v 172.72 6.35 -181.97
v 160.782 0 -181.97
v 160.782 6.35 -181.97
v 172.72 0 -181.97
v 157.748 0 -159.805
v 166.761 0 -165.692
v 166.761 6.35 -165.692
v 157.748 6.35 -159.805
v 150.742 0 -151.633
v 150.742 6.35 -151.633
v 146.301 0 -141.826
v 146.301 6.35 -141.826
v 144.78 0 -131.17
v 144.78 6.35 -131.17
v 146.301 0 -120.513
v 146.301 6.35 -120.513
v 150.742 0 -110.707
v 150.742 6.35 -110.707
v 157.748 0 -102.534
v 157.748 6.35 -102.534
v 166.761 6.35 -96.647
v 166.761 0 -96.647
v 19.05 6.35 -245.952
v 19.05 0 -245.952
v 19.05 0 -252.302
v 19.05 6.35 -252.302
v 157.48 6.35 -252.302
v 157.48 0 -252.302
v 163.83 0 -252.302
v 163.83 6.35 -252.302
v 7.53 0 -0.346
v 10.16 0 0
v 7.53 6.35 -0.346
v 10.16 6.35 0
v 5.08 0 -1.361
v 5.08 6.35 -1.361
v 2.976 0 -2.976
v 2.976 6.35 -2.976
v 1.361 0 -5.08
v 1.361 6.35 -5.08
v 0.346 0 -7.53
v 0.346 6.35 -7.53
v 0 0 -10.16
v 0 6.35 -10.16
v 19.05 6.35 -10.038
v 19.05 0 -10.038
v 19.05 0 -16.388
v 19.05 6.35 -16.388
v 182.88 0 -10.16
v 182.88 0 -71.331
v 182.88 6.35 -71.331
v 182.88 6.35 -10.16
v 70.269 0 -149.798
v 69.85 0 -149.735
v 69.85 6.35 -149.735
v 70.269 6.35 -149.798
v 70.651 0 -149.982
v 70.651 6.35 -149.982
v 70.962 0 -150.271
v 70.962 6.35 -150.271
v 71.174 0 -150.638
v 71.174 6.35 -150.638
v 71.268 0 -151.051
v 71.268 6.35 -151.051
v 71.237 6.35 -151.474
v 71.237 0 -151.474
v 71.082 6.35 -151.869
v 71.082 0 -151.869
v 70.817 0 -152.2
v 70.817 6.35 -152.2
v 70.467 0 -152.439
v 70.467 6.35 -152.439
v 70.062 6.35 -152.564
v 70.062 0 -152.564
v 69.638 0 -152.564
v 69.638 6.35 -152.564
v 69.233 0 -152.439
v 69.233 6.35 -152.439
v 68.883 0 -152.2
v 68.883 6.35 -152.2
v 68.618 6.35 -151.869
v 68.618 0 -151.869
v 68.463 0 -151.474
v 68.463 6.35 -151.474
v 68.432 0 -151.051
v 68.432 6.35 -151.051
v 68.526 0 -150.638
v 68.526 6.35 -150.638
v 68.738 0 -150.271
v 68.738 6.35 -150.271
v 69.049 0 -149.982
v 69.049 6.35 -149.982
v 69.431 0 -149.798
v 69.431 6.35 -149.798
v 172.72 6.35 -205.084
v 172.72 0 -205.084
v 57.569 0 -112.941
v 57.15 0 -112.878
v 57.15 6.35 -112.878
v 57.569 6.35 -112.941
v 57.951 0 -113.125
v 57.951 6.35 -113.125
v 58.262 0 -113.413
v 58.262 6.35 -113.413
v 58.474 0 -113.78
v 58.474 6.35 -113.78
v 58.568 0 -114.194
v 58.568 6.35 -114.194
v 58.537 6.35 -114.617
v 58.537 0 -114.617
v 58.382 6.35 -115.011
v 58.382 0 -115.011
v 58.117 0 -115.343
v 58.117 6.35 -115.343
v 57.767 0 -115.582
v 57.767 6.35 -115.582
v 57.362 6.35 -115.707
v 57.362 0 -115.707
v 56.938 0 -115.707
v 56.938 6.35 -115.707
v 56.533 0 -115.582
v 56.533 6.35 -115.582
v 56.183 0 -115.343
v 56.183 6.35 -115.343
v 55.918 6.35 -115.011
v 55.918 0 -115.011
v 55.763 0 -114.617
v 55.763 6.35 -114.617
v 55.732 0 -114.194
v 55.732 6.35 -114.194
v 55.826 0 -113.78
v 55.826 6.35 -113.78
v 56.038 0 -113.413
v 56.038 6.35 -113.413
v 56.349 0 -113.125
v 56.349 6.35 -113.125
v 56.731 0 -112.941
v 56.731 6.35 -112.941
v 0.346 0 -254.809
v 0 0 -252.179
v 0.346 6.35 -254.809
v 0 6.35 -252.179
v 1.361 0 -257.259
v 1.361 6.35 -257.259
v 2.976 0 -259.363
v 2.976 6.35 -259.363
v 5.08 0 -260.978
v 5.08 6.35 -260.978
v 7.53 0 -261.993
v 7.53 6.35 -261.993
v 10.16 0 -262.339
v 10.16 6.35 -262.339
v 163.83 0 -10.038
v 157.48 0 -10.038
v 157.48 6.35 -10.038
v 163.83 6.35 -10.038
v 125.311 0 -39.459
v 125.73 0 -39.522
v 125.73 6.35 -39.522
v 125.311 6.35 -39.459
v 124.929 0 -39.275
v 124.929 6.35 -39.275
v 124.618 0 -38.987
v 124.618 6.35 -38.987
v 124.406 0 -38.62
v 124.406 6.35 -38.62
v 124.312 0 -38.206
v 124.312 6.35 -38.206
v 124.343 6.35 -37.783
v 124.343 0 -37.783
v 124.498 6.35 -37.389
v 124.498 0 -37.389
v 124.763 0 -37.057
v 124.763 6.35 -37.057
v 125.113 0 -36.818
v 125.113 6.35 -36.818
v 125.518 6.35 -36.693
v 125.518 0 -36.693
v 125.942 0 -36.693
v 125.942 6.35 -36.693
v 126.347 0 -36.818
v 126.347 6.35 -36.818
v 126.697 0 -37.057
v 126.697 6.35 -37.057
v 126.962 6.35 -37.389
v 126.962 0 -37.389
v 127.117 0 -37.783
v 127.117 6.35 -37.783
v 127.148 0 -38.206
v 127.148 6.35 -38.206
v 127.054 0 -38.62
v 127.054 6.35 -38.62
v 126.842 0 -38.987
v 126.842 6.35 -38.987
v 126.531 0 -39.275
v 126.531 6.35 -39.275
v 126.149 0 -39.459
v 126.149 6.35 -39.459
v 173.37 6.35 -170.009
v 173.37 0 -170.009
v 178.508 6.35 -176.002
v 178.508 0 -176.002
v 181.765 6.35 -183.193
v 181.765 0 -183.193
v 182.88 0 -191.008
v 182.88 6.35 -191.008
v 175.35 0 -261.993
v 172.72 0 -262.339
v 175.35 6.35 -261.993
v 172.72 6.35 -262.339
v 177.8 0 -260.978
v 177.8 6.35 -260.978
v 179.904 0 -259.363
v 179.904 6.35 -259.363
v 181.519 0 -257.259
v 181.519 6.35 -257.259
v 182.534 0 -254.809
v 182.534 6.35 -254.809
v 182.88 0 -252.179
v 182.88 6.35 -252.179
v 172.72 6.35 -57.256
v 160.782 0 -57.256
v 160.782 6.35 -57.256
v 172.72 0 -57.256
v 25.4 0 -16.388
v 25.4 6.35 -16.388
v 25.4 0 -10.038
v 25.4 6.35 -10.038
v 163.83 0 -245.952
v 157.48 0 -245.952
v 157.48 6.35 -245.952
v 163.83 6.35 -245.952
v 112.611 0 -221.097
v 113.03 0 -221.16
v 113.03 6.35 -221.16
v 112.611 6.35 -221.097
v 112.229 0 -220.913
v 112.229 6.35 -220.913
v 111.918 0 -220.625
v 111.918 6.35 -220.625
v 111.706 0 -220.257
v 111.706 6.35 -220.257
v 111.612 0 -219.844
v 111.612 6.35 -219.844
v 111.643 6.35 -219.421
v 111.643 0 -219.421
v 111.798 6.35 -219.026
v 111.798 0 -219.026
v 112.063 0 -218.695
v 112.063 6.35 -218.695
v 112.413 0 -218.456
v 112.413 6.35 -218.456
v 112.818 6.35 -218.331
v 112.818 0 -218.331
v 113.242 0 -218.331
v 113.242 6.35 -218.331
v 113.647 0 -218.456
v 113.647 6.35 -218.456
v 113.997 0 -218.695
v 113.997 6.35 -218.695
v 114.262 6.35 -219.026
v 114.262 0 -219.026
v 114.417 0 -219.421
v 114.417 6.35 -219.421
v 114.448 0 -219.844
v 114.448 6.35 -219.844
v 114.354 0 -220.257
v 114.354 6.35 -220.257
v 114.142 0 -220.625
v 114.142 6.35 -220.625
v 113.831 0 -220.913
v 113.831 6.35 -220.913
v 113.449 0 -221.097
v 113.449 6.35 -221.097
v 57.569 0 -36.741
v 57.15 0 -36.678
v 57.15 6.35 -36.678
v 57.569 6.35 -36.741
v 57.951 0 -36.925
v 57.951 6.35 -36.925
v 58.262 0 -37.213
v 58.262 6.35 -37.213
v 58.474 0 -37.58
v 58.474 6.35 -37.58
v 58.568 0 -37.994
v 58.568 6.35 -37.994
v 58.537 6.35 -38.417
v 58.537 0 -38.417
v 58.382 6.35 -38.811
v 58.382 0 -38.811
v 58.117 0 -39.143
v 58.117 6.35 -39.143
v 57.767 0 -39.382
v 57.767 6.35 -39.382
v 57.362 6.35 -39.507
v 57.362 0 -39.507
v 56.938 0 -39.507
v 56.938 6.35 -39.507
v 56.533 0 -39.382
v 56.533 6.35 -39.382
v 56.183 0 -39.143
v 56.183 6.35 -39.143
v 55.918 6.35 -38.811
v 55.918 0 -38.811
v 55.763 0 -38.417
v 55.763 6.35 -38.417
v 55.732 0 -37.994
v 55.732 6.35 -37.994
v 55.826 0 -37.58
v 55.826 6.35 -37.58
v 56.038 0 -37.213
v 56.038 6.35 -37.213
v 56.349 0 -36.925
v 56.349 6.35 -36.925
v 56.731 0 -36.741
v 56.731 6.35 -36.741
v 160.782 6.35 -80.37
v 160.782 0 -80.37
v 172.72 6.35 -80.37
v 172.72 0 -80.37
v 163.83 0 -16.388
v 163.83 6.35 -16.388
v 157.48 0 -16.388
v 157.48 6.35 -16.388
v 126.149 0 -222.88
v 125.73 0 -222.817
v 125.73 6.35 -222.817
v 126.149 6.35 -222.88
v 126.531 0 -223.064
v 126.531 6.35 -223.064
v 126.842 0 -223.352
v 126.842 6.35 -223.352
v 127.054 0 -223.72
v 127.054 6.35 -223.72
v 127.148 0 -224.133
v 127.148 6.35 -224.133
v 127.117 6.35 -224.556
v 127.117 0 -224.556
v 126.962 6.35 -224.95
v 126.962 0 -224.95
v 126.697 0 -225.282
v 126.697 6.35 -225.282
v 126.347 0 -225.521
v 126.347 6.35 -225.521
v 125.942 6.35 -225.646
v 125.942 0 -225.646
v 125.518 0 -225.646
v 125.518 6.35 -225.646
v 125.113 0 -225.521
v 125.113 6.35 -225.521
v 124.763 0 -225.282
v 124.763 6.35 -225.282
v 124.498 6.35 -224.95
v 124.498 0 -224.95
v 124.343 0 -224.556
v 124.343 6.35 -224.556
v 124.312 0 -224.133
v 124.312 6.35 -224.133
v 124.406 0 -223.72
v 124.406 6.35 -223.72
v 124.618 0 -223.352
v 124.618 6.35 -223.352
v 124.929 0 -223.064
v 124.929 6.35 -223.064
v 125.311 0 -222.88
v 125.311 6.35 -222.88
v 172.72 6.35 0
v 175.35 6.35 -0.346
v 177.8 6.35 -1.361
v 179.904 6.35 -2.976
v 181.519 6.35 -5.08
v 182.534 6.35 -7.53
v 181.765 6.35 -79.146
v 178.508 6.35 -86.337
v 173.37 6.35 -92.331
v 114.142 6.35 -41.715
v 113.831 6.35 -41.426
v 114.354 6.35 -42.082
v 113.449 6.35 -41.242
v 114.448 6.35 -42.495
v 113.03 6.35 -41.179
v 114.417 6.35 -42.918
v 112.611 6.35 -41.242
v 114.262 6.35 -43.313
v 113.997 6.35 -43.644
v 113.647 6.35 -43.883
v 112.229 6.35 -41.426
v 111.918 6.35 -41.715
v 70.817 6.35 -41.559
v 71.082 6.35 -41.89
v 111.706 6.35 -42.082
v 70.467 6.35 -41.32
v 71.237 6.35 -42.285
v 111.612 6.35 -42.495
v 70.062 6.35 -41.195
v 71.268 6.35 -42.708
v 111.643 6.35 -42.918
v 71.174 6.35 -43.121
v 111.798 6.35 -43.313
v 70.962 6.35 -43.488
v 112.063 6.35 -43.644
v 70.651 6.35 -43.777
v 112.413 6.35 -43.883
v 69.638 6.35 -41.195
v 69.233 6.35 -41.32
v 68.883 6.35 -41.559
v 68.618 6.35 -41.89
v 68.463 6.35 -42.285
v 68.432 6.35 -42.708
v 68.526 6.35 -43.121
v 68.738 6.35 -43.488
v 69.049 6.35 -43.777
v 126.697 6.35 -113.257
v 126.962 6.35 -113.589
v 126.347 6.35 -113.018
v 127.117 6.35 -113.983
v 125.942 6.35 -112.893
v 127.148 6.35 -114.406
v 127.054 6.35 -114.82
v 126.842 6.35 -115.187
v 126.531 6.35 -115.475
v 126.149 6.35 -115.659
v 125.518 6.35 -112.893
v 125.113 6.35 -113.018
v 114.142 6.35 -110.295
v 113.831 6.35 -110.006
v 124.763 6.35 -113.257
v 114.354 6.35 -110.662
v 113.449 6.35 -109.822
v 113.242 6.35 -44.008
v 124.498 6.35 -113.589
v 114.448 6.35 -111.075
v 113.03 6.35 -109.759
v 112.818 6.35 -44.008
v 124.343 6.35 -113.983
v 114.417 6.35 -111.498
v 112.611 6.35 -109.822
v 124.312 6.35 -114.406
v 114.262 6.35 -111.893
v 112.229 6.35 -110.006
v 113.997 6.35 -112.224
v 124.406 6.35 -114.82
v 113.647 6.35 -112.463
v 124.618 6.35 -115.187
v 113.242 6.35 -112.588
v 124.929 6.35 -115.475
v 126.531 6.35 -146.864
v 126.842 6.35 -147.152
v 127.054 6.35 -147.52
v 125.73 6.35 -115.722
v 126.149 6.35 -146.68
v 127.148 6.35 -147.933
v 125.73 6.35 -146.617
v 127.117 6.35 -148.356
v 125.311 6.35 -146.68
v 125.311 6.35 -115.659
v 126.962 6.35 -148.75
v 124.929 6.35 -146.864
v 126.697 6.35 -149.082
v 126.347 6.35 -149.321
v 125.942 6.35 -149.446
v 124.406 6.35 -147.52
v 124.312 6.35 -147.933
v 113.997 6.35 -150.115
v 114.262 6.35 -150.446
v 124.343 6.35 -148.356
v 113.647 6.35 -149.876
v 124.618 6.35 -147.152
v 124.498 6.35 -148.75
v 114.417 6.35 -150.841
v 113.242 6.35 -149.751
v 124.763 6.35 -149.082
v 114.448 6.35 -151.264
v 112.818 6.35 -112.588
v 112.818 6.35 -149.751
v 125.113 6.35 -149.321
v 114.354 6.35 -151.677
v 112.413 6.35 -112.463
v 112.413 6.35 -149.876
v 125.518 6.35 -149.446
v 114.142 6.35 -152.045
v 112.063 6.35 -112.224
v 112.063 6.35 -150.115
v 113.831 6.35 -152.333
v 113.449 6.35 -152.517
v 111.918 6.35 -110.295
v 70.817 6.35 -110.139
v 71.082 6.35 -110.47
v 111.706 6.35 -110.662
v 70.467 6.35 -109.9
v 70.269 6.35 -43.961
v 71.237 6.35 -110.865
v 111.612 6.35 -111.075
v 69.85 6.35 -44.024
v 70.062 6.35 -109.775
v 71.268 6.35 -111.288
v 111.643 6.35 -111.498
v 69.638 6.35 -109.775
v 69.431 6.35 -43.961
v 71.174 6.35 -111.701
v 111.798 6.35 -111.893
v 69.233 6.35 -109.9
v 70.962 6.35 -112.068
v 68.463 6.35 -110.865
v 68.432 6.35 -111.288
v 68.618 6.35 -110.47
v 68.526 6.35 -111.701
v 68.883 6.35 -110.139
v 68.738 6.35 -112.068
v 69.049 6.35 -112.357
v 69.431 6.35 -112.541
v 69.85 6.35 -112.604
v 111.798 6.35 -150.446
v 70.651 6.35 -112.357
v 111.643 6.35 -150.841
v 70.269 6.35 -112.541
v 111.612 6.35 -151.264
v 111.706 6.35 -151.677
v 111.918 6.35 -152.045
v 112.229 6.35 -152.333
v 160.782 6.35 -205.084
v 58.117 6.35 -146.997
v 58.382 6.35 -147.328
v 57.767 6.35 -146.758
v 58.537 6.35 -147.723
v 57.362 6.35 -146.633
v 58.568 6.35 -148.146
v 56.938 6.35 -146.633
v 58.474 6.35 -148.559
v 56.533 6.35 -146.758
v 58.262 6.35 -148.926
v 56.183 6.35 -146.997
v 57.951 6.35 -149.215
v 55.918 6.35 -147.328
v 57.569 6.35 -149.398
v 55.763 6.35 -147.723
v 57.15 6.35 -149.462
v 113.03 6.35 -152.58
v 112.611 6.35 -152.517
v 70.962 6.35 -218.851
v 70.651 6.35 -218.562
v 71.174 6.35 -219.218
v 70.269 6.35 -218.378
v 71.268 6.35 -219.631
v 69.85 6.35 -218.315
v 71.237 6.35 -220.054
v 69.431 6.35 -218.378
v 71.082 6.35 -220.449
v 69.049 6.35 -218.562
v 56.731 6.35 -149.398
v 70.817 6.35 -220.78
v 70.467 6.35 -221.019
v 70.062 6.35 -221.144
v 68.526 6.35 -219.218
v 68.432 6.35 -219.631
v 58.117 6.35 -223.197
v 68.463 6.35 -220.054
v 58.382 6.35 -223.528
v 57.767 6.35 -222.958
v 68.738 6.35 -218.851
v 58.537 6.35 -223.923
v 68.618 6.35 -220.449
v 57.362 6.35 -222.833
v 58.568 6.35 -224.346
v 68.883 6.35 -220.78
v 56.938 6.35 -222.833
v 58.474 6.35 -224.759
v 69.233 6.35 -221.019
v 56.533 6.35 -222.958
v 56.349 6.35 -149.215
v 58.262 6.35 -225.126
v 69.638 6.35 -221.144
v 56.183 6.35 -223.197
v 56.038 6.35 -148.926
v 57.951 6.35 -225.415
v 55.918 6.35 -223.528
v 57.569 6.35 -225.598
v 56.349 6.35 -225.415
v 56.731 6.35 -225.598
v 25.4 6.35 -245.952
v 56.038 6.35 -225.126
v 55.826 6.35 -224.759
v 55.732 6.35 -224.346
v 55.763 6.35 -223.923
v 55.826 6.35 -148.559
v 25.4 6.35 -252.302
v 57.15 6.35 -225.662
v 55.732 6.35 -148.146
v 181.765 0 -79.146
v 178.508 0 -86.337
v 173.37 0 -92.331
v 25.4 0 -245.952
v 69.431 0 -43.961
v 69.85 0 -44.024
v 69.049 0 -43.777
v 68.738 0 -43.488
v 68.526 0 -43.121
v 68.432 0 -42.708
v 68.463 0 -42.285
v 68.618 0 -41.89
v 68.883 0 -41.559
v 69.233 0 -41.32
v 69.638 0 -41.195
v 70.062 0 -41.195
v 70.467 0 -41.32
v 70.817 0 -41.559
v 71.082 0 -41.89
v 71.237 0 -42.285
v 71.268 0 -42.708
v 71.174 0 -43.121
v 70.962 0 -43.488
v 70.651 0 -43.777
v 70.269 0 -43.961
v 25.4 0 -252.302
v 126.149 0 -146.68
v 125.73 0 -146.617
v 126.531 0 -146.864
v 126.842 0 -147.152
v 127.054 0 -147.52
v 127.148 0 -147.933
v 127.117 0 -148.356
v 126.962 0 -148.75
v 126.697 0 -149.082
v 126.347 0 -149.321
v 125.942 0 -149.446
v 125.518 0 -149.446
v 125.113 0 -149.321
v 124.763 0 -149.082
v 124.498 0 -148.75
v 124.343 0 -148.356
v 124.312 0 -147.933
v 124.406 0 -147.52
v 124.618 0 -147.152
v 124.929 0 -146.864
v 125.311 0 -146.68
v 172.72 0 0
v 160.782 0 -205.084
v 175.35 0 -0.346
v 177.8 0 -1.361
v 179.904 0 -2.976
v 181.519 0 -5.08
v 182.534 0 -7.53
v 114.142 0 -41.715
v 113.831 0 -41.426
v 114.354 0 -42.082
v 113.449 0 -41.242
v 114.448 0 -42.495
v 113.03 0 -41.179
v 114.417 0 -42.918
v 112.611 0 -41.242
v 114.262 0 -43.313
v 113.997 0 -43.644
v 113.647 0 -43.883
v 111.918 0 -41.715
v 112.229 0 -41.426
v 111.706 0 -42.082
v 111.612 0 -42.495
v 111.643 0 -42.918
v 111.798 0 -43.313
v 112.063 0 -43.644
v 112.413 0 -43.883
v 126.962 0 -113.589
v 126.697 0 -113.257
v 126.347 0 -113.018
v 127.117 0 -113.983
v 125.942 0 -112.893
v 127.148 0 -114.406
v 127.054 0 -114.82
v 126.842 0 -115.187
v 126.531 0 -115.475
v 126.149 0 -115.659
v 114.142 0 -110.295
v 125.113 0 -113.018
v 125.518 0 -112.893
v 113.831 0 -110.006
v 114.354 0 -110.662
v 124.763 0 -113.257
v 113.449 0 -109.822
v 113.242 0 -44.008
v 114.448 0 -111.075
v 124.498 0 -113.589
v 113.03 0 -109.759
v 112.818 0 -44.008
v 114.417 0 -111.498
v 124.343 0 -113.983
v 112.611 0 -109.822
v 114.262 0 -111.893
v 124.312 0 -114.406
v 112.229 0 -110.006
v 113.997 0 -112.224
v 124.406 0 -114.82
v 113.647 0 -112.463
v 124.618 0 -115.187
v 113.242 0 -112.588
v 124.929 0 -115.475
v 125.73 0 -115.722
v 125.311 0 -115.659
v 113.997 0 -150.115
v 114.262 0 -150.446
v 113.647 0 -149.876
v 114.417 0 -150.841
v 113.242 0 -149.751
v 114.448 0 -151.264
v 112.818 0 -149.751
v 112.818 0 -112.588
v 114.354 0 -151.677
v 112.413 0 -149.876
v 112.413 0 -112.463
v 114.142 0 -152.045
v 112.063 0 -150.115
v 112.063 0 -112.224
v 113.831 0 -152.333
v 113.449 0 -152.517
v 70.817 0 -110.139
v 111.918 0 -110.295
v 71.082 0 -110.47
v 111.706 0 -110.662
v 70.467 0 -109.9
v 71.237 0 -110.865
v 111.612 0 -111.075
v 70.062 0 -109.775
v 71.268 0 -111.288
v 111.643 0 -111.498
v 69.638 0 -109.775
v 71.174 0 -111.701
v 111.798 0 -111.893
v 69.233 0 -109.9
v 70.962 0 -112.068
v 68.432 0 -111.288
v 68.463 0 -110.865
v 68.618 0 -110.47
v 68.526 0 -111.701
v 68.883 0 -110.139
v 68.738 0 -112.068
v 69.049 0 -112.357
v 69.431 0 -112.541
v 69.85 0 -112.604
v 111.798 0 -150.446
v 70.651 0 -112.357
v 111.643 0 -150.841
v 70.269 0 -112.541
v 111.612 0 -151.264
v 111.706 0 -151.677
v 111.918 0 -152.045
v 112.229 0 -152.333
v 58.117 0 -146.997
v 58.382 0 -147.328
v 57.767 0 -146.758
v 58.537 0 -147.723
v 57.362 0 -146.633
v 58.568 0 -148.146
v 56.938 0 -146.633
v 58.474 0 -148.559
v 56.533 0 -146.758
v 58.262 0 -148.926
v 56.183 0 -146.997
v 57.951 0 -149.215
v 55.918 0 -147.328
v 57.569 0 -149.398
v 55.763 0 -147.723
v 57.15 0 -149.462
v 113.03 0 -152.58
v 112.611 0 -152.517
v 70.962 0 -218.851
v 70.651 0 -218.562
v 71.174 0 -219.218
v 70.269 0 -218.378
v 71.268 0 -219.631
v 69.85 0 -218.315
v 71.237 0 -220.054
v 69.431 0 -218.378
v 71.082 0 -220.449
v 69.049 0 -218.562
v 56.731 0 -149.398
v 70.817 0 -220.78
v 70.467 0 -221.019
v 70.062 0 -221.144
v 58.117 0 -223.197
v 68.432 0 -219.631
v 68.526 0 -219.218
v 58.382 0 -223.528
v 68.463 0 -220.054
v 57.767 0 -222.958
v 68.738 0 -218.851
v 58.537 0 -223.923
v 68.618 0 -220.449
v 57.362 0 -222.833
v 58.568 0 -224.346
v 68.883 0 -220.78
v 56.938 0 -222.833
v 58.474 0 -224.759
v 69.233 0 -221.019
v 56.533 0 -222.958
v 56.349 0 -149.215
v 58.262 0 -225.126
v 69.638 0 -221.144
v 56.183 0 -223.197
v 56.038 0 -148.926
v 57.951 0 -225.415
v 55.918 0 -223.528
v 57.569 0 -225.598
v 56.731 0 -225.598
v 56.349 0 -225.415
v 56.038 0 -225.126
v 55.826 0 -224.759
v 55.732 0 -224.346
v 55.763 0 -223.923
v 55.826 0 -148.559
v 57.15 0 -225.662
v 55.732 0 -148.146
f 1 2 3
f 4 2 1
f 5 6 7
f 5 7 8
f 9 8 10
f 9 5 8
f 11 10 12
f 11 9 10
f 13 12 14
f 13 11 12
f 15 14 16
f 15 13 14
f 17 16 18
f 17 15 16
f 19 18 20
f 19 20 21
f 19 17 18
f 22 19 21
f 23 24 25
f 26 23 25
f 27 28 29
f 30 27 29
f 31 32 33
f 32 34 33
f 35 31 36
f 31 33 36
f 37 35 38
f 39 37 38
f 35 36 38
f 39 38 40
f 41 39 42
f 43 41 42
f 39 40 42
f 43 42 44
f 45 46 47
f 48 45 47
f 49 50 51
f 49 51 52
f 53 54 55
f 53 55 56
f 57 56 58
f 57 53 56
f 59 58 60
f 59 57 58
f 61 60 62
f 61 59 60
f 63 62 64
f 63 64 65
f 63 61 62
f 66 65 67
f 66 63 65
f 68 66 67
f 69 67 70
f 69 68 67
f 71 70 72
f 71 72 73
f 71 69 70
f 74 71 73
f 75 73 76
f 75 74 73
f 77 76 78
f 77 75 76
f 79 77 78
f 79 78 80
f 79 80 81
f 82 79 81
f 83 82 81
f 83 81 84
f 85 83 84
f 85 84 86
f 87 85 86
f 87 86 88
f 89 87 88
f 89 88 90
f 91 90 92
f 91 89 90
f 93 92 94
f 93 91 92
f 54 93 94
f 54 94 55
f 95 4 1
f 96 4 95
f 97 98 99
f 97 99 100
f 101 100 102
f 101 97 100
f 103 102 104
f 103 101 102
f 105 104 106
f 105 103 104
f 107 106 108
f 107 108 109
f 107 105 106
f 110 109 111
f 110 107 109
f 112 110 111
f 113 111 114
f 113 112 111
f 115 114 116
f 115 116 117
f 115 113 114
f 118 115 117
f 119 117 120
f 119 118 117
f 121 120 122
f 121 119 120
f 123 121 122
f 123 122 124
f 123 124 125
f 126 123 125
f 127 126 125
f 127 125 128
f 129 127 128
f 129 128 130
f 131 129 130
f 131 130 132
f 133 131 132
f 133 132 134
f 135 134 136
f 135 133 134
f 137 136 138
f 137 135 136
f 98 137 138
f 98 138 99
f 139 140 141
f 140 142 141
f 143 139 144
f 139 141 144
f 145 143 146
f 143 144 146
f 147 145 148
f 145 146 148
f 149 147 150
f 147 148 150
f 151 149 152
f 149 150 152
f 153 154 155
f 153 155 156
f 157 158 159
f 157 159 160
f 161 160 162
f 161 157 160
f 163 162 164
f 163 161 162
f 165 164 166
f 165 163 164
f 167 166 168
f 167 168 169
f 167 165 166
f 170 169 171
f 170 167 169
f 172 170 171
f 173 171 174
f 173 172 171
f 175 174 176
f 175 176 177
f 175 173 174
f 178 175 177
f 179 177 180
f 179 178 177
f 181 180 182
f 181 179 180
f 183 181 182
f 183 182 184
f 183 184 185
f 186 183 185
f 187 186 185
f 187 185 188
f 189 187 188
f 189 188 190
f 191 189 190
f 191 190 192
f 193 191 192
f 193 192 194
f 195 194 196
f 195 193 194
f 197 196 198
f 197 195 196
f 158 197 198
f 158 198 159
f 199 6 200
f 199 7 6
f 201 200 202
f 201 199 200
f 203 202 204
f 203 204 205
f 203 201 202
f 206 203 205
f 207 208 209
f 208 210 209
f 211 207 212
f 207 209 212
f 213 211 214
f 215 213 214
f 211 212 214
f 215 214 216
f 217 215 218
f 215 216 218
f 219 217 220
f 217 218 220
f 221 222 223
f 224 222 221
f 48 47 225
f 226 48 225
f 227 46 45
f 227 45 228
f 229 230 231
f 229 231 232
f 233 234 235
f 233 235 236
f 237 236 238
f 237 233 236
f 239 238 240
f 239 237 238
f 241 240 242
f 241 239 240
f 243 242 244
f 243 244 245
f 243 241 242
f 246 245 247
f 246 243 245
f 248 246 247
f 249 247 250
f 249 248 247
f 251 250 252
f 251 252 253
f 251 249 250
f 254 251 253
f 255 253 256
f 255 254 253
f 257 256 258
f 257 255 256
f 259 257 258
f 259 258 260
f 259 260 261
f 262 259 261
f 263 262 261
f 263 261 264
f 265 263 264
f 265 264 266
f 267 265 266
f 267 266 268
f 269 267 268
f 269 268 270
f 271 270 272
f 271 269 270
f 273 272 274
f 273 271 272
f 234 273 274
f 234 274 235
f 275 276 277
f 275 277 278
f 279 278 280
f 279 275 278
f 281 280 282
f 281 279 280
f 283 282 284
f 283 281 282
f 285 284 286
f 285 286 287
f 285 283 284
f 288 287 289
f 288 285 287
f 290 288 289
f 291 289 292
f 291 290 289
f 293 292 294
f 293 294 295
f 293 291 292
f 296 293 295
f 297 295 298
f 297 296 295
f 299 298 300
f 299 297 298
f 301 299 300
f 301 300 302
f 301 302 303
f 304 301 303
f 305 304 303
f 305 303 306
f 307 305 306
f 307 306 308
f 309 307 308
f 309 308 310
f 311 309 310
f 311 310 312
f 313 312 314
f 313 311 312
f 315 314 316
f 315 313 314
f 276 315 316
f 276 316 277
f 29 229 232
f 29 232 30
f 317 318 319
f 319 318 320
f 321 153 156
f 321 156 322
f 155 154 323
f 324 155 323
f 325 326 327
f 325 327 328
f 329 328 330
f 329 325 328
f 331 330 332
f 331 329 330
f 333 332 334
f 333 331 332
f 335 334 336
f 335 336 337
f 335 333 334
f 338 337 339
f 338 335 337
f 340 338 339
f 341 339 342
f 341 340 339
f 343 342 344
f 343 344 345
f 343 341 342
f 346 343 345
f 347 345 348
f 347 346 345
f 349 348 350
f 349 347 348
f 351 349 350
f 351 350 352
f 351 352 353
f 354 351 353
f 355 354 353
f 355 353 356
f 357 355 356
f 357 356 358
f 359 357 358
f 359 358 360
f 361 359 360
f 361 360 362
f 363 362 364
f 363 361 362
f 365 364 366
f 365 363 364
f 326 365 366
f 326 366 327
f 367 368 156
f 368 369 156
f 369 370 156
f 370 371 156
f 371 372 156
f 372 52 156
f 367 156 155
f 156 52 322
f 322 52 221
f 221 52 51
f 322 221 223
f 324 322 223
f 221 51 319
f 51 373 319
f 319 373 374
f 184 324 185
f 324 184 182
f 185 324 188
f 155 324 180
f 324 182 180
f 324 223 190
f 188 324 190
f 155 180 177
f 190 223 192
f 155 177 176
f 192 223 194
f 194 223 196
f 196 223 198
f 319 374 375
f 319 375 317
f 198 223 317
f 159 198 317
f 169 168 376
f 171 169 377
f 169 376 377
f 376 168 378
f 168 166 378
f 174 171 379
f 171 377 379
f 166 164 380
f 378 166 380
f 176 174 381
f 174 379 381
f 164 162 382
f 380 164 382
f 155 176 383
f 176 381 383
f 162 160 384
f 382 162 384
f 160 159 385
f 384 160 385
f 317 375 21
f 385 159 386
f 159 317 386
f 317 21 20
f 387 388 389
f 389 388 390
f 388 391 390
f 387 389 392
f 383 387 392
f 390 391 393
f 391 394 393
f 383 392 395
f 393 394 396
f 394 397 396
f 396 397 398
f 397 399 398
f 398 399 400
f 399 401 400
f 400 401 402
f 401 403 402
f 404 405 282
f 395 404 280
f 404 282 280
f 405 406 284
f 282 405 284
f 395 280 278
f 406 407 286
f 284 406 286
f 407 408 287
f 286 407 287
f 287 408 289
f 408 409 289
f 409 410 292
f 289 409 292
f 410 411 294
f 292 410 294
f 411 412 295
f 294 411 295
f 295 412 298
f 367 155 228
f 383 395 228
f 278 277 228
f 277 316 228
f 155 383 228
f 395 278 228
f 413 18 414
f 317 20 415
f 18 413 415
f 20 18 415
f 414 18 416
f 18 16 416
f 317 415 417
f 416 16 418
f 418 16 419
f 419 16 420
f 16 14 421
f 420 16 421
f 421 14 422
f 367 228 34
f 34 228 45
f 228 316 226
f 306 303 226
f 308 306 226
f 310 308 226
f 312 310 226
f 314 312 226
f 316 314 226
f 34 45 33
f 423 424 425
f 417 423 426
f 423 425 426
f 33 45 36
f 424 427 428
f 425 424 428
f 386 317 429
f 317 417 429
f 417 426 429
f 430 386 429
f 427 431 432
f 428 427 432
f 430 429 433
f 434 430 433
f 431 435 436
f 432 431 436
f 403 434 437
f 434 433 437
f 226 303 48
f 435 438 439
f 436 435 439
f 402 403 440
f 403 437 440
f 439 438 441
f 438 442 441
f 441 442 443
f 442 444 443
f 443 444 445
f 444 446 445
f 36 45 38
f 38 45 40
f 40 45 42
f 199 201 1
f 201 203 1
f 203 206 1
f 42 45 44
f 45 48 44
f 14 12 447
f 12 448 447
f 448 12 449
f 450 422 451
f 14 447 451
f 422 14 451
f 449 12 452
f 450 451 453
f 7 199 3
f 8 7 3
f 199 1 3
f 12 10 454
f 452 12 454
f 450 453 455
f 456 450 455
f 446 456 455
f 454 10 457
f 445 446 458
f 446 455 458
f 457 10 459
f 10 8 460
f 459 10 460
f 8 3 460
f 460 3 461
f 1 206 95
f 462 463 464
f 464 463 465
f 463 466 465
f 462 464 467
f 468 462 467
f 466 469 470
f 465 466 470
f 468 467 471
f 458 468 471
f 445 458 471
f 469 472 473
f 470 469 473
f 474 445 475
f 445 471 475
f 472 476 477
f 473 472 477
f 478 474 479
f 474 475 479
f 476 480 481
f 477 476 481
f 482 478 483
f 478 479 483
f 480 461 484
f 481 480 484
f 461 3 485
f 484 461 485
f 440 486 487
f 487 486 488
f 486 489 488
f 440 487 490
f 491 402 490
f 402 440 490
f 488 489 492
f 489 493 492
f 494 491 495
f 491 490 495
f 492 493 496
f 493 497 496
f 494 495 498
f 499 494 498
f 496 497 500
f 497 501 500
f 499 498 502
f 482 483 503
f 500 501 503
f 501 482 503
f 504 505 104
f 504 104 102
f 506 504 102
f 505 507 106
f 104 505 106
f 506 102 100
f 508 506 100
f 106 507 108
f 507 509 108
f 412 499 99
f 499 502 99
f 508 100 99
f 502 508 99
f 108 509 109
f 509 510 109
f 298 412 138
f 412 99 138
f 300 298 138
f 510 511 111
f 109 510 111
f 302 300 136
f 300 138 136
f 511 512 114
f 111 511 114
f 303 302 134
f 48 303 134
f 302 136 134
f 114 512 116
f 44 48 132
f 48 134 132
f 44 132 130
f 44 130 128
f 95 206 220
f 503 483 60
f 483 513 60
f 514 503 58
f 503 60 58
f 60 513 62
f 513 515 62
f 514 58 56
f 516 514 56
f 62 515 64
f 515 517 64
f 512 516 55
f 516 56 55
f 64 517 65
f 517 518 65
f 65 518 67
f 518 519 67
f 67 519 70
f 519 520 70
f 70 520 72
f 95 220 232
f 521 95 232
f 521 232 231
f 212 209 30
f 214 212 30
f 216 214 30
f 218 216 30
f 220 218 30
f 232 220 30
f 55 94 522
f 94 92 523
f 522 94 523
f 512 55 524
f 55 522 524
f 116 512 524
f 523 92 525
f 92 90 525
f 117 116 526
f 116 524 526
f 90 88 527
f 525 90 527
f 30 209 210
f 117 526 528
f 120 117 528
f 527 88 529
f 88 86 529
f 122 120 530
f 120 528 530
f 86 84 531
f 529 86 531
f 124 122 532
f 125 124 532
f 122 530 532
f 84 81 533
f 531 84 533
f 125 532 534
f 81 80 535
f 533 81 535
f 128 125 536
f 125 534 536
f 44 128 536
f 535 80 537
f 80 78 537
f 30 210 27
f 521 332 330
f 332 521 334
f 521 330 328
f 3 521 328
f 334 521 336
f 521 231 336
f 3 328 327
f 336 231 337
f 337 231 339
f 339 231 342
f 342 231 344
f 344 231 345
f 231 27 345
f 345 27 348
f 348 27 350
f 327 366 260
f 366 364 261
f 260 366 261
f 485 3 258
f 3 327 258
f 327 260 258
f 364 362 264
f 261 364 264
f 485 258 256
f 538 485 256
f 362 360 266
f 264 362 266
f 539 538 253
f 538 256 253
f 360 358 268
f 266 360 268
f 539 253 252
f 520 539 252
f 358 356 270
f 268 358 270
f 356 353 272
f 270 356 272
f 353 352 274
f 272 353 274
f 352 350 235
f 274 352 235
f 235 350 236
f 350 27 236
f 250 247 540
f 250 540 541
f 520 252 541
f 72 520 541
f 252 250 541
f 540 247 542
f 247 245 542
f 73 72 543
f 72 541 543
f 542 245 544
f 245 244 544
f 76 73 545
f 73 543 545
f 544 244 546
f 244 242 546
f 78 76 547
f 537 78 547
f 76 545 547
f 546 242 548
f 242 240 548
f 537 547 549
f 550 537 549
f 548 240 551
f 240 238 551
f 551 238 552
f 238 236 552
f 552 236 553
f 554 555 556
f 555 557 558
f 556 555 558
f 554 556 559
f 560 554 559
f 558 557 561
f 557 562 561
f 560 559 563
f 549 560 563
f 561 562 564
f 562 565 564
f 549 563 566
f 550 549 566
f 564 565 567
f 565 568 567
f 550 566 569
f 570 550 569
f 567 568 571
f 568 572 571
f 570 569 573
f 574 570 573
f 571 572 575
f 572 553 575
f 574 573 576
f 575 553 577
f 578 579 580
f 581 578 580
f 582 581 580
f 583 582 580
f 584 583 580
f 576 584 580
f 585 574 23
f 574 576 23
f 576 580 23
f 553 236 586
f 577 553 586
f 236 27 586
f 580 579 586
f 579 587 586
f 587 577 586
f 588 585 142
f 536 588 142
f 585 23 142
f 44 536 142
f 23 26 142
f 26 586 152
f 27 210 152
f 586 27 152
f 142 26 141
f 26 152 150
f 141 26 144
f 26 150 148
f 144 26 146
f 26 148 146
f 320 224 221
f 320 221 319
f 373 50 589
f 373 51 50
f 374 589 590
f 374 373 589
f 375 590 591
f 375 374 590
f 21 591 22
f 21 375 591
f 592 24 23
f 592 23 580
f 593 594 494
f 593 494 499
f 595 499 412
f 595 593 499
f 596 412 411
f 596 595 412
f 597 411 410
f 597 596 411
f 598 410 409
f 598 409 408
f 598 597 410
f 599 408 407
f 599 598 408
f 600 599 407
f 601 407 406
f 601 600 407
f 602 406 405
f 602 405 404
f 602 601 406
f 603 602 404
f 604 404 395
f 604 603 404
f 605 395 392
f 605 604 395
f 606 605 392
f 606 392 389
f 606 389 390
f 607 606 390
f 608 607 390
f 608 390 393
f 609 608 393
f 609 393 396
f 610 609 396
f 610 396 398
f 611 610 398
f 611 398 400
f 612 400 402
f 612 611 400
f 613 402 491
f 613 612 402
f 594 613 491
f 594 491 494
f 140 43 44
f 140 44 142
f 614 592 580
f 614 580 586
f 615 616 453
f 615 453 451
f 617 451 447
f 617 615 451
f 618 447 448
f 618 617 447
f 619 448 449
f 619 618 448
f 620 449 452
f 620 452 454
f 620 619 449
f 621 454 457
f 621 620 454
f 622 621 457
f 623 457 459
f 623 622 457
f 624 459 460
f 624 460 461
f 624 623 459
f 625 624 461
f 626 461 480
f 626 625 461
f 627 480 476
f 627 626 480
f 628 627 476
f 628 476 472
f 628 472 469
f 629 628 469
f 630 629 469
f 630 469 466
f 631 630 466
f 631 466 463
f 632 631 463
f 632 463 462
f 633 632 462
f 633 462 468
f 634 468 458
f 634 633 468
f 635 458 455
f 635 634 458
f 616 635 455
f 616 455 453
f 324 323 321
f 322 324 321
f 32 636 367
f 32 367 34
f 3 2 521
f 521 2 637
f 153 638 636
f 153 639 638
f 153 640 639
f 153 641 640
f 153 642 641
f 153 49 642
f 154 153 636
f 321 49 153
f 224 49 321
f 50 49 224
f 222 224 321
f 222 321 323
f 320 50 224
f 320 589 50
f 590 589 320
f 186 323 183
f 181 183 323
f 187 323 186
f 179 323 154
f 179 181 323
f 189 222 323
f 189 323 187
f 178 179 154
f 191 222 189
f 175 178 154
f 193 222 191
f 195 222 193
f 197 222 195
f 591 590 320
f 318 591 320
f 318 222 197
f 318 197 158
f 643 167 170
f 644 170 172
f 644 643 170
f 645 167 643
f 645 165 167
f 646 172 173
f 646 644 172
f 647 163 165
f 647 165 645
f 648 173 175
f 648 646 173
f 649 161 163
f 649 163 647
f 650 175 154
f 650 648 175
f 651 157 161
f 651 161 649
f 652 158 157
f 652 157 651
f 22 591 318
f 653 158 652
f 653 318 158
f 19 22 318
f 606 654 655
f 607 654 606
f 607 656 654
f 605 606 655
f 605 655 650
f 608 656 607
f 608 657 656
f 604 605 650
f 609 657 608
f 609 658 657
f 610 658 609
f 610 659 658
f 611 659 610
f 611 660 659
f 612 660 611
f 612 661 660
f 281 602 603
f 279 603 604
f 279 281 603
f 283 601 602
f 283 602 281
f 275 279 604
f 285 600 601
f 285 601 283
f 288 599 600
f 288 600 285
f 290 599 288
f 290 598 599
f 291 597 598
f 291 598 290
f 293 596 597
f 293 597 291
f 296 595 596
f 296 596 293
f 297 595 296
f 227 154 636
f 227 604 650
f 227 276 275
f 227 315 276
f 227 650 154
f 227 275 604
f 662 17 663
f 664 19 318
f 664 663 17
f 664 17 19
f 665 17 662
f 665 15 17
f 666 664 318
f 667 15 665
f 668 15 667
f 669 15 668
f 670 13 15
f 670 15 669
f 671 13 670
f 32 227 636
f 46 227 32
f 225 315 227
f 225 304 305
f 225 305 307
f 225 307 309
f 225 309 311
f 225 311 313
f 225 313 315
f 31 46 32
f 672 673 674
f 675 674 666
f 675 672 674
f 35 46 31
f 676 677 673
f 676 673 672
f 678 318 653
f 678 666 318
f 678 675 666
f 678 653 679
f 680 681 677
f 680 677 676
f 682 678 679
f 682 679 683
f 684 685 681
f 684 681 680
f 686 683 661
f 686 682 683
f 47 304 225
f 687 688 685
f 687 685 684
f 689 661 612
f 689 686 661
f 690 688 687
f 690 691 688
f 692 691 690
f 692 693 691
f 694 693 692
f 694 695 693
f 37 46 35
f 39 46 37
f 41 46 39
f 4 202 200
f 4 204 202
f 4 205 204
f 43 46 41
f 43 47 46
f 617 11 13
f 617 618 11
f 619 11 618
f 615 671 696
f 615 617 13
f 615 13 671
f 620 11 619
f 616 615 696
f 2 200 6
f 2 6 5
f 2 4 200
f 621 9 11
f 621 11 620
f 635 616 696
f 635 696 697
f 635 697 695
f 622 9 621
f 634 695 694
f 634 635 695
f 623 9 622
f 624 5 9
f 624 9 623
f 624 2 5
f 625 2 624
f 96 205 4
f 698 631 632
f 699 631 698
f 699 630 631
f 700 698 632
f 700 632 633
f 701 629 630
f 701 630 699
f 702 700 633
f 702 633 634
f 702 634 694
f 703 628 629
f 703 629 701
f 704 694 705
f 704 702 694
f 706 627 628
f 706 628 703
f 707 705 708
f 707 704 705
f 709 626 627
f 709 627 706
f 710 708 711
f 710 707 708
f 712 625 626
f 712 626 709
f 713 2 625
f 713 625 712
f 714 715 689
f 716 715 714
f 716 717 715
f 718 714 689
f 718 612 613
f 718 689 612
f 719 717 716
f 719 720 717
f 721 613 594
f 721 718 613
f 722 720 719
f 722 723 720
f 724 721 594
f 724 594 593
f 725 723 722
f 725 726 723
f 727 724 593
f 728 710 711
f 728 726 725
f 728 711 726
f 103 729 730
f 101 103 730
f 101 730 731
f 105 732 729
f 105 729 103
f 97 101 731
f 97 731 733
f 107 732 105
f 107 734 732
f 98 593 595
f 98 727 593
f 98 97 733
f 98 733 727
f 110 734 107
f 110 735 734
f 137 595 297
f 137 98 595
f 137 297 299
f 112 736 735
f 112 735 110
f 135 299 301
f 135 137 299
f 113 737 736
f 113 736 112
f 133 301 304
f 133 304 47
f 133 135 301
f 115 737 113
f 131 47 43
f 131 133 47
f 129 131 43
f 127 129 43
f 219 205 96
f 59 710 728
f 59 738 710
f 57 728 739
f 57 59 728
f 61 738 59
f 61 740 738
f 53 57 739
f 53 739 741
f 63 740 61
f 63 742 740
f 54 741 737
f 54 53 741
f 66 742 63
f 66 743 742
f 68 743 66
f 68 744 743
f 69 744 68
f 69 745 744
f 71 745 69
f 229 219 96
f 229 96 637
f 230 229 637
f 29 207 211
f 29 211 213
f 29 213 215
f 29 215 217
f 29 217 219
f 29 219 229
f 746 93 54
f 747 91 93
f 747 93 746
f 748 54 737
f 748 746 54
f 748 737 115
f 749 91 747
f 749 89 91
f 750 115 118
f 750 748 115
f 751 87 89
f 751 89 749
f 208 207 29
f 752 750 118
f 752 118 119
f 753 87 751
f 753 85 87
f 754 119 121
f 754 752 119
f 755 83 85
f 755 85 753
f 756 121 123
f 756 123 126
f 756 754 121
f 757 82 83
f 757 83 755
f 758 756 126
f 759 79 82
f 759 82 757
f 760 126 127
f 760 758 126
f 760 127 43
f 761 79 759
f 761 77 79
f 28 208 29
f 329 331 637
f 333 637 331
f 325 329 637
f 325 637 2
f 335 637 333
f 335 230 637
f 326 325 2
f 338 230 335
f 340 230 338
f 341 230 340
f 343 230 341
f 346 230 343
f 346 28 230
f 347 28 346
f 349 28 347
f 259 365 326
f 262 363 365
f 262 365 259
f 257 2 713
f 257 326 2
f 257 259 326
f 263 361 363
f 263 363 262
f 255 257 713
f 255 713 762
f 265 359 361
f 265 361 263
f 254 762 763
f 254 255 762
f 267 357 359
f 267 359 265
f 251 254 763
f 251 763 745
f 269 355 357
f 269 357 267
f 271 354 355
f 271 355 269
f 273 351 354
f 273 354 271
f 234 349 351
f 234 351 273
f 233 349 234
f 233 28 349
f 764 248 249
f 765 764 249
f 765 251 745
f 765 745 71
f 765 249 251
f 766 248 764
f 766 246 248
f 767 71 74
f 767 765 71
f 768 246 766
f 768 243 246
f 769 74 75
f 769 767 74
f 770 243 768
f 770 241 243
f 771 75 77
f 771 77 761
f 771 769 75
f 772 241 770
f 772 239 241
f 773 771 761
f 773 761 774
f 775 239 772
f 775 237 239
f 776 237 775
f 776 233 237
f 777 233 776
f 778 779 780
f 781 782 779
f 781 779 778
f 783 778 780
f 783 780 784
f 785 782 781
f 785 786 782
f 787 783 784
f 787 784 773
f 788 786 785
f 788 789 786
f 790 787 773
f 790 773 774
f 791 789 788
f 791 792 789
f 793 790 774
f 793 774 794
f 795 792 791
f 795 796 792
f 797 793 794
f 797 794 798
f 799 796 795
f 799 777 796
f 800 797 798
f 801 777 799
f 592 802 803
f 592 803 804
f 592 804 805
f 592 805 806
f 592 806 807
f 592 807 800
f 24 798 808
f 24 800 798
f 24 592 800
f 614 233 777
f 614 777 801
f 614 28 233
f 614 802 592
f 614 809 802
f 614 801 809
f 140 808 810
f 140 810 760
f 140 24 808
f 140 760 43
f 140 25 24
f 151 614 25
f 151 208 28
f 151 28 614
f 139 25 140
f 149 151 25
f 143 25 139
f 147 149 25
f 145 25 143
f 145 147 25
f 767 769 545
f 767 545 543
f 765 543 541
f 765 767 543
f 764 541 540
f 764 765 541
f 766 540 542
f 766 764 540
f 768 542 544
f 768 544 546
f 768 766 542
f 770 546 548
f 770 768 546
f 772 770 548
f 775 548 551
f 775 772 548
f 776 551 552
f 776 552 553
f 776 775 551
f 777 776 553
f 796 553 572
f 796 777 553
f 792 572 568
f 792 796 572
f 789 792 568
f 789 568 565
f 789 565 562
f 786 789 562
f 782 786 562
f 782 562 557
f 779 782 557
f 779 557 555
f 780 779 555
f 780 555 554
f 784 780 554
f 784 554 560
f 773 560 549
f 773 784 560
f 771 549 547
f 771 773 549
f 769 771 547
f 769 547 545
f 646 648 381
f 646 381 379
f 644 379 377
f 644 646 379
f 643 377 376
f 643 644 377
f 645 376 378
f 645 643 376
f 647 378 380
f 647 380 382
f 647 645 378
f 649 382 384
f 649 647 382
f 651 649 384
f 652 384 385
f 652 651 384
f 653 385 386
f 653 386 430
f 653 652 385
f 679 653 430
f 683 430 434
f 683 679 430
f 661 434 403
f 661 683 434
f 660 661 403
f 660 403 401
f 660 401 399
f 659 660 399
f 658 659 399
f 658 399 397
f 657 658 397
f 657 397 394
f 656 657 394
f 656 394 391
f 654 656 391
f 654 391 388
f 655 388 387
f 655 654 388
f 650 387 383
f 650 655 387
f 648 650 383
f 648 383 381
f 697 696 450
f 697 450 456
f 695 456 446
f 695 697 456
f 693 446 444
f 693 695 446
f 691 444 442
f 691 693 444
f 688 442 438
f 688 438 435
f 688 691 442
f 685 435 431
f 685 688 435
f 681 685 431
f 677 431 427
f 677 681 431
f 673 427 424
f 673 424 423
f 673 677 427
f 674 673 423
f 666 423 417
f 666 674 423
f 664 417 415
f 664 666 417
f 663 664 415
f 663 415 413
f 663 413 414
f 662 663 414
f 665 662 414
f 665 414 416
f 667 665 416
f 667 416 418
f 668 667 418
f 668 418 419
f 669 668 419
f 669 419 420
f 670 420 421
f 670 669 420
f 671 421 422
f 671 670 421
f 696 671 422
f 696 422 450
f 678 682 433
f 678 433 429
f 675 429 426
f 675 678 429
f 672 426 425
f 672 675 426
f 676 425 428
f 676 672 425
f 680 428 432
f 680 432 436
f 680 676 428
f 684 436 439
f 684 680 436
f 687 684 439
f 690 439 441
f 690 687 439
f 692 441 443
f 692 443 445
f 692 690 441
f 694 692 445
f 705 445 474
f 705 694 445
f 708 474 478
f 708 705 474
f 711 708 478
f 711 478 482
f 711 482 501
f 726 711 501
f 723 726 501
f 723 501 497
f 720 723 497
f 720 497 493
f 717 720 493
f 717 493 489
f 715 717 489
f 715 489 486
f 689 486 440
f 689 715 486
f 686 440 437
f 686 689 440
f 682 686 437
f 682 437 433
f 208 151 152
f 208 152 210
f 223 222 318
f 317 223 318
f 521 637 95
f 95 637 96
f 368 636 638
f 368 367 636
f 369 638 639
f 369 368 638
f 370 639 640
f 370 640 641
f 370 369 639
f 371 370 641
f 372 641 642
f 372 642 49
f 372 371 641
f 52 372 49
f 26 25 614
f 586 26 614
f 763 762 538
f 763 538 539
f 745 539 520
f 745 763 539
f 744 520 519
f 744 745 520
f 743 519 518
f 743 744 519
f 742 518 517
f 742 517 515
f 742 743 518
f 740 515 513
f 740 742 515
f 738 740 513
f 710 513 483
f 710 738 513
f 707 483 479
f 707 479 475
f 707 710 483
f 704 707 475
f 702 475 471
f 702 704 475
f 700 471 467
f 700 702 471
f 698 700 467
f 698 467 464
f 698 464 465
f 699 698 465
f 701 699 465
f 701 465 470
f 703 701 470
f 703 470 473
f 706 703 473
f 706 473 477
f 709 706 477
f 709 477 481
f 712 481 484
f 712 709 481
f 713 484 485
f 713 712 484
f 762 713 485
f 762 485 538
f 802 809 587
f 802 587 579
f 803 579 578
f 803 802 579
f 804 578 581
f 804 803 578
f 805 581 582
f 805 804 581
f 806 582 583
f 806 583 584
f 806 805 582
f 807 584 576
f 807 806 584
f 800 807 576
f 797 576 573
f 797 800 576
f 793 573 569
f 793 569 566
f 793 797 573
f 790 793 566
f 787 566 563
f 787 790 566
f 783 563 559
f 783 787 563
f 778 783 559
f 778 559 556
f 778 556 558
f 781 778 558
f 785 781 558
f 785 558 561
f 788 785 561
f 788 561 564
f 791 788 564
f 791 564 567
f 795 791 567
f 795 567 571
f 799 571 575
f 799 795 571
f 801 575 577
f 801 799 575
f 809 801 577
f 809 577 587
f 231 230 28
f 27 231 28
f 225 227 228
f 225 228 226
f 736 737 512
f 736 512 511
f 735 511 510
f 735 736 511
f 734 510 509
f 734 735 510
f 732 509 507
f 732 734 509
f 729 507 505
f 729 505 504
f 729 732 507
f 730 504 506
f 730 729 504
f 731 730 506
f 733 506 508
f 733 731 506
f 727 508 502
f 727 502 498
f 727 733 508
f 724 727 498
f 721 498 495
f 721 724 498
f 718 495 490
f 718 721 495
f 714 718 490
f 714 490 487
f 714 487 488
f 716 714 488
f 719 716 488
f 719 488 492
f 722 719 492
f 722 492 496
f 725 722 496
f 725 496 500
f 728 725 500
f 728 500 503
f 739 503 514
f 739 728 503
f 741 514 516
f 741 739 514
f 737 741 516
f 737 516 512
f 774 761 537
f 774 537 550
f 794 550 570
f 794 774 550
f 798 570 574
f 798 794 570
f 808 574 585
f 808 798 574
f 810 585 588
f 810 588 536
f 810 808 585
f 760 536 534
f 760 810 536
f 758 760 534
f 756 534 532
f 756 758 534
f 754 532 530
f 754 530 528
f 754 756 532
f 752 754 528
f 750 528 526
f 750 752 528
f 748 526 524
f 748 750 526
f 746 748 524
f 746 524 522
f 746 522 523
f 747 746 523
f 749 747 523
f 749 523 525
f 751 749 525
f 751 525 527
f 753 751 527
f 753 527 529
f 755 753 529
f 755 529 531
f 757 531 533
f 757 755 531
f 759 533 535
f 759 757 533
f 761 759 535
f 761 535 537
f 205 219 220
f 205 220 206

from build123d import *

# Parameters (mm, degrees)
SKETCH3_R           = 1.4224
SKETCH3_W           = 6.35
SKETCH3_H           = 6.35
SKETCH3_W_2         = 11.938
SKETCH3_H_2         = 23.114
BOSS_EXTRUDE1_DEPTH = 6.35
FILLET1_R           = 10.16
FILLET2_R           = 27.94


with BuildPart() as part:
    # Sketch3 → Boss-Extrude1 (new body)
    with BuildSketch(Plane(origin=(0, 0, 0), x_dir=(1, 0, 0), z_dir=(0, 1, 0))):
        with BuildLine():
            Line((182.88, 0), (0, 0))
            Line((0, 0), (0, 262.339276313))
            Line((0, 262.339276313), (182.88, 262.339276313))
            Line((182.88, 262.339276313), (182.88, 169.269638157))
            ThreePointArc((182.88, 169.269638157), (144.78, 131.169638157), (182.88, 93.069638157))
            Line((182.88, 93.069638157), (182.88, 0))
        make_face()
        with Locations(Location((57.15, 38.1, 0), (0, 0, 270))):
            Circle(SKETCH3_R, mode=Mode.SUBTRACT)
        with Locations(Location((57.15, 114.3, 0), (0, 0, 270))):
            Circle(SKETCH3_R, mode=Mode.SUBTRACT)
        with Locations(Location((125.73, 114.3, 0), (0, 0, 90))):
            Circle(SKETCH3_R, mode=Mode.SUBTRACT)
        with Locations(Location((125.73, 38.1, 0), (0, 0, 90))):
            Circle(SKETCH3_R, mode=Mode.SUBTRACT)
        with Locations(Location((69.85, 151.157668748, 0), (0, 0, 270))):
            Circle(SKETCH3_R, mode=Mode.SUBTRACT)
        with Locations(Location((69.85, 219.737668748, 0), (0, 0, 270))):
            Circle(SKETCH3_R, mode=Mode.SUBTRACT)
        with Locations(Location((113.03, 151.157668748, 0), (0, 0, 90))):
            Circle(SKETCH3_R, mode=Mode.SUBTRACT)
        with Locations(Location((113.03, 219.737668748, 0), (0, 0, 90))):
            Circle(SKETCH3_R, mode=Mode.SUBTRACT)
        with Locations(Location((113.03, 42.601607565, 0), (0, 0, 270))):
            Circle(SKETCH3_R, mode=Mode.SUBTRACT)
        with Locations(Location((113.03, 111.181607565, 0), (0, 0, 270))):
            Circle(SKETCH3_R, mode=Mode.SUBTRACT)
        with Locations(Location((69.85, 111.181607565, 0), (0, 0, 90))):
            Circle(SKETCH3_R, mode=Mode.SUBTRACT)
        with Locations(Location((69.85, 42.601607565, 0), (0, 0, 90))):
            Circle(SKETCH3_R, mode=Mode.SUBTRACT)
        with Locations(Location((125.73, 148.039276313, 0), (0, 0, 270))):
            Circle(SKETCH3_R, mode=Mode.SUBTRACT)
        with Locations(Location((125.73, 224.239276313, 0), (0, 0, 270))):
            Circle(SKETCH3_R, mode=Mode.SUBTRACT)
        with Locations(Location((57.15, 224.239276313, 0), (0, 0, 90))):
            Circle(SKETCH3_R, mode=Mode.SUBTRACT)
        with Locations(Location((57.15, 148.039276313, 0), (0, 0, 90))):
            Circle(SKETCH3_R, mode=Mode.SUBTRACT)
        with Locations((22.225, 13.212735966)):
            Rectangle(SKETCH3_W, SKETCH3_H, mode=Mode.SUBTRACT)
        with Locations((160.655, 13.212735966)):
            Rectangle(SKETCH3_W, SKETCH3_H, mode=Mode.SUBTRACT)
        with Locations((160.655, 249.126540348)):
            Rectangle(SKETCH3_W, SKETCH3_H, mode=Mode.SUBTRACT)
        with Locations((22.225, 249.126540348)):
            Rectangle(SKETCH3_W, SKETCH3_H, mode=Mode.SUBTRACT)
        with Locations((166.751, 193.526638157)):
            Rectangle(SKETCH3_W_2, SKETCH3_H_2, mode=Mode.SUBTRACT)
        with Locations((166.751, 68.812638157)):
            Rectangle(SKETCH3_W_2, SKETCH3_H_2, mode=Mode.SUBTRACT)
    extrude(amount=BOSS_EXTRUDE1_DEPTH)

    # Fillet1
    fillet1_edges = [part.edges().sort_by_distance(p)[0] for p in [
        (0, 3.175, -262.339276313),
        (182.88, 3.175, -262.339276313),
        (182.88, 3.175, 0),
        (0, 3.175, 0),
    ]]
    fillet(fillet1_edges, radius=FILLET1_R)

    # Fillet2
    fillet2_edges = [part.edges().sort_by_distance(p)[0] for p in [
        (182.88, 3.175, -169.269638157),
        (182.88, 3.175, -93.069638157),
    ]]
    fillet(fillet2_edges, radius=FILLET2_R)


solid = part.part
